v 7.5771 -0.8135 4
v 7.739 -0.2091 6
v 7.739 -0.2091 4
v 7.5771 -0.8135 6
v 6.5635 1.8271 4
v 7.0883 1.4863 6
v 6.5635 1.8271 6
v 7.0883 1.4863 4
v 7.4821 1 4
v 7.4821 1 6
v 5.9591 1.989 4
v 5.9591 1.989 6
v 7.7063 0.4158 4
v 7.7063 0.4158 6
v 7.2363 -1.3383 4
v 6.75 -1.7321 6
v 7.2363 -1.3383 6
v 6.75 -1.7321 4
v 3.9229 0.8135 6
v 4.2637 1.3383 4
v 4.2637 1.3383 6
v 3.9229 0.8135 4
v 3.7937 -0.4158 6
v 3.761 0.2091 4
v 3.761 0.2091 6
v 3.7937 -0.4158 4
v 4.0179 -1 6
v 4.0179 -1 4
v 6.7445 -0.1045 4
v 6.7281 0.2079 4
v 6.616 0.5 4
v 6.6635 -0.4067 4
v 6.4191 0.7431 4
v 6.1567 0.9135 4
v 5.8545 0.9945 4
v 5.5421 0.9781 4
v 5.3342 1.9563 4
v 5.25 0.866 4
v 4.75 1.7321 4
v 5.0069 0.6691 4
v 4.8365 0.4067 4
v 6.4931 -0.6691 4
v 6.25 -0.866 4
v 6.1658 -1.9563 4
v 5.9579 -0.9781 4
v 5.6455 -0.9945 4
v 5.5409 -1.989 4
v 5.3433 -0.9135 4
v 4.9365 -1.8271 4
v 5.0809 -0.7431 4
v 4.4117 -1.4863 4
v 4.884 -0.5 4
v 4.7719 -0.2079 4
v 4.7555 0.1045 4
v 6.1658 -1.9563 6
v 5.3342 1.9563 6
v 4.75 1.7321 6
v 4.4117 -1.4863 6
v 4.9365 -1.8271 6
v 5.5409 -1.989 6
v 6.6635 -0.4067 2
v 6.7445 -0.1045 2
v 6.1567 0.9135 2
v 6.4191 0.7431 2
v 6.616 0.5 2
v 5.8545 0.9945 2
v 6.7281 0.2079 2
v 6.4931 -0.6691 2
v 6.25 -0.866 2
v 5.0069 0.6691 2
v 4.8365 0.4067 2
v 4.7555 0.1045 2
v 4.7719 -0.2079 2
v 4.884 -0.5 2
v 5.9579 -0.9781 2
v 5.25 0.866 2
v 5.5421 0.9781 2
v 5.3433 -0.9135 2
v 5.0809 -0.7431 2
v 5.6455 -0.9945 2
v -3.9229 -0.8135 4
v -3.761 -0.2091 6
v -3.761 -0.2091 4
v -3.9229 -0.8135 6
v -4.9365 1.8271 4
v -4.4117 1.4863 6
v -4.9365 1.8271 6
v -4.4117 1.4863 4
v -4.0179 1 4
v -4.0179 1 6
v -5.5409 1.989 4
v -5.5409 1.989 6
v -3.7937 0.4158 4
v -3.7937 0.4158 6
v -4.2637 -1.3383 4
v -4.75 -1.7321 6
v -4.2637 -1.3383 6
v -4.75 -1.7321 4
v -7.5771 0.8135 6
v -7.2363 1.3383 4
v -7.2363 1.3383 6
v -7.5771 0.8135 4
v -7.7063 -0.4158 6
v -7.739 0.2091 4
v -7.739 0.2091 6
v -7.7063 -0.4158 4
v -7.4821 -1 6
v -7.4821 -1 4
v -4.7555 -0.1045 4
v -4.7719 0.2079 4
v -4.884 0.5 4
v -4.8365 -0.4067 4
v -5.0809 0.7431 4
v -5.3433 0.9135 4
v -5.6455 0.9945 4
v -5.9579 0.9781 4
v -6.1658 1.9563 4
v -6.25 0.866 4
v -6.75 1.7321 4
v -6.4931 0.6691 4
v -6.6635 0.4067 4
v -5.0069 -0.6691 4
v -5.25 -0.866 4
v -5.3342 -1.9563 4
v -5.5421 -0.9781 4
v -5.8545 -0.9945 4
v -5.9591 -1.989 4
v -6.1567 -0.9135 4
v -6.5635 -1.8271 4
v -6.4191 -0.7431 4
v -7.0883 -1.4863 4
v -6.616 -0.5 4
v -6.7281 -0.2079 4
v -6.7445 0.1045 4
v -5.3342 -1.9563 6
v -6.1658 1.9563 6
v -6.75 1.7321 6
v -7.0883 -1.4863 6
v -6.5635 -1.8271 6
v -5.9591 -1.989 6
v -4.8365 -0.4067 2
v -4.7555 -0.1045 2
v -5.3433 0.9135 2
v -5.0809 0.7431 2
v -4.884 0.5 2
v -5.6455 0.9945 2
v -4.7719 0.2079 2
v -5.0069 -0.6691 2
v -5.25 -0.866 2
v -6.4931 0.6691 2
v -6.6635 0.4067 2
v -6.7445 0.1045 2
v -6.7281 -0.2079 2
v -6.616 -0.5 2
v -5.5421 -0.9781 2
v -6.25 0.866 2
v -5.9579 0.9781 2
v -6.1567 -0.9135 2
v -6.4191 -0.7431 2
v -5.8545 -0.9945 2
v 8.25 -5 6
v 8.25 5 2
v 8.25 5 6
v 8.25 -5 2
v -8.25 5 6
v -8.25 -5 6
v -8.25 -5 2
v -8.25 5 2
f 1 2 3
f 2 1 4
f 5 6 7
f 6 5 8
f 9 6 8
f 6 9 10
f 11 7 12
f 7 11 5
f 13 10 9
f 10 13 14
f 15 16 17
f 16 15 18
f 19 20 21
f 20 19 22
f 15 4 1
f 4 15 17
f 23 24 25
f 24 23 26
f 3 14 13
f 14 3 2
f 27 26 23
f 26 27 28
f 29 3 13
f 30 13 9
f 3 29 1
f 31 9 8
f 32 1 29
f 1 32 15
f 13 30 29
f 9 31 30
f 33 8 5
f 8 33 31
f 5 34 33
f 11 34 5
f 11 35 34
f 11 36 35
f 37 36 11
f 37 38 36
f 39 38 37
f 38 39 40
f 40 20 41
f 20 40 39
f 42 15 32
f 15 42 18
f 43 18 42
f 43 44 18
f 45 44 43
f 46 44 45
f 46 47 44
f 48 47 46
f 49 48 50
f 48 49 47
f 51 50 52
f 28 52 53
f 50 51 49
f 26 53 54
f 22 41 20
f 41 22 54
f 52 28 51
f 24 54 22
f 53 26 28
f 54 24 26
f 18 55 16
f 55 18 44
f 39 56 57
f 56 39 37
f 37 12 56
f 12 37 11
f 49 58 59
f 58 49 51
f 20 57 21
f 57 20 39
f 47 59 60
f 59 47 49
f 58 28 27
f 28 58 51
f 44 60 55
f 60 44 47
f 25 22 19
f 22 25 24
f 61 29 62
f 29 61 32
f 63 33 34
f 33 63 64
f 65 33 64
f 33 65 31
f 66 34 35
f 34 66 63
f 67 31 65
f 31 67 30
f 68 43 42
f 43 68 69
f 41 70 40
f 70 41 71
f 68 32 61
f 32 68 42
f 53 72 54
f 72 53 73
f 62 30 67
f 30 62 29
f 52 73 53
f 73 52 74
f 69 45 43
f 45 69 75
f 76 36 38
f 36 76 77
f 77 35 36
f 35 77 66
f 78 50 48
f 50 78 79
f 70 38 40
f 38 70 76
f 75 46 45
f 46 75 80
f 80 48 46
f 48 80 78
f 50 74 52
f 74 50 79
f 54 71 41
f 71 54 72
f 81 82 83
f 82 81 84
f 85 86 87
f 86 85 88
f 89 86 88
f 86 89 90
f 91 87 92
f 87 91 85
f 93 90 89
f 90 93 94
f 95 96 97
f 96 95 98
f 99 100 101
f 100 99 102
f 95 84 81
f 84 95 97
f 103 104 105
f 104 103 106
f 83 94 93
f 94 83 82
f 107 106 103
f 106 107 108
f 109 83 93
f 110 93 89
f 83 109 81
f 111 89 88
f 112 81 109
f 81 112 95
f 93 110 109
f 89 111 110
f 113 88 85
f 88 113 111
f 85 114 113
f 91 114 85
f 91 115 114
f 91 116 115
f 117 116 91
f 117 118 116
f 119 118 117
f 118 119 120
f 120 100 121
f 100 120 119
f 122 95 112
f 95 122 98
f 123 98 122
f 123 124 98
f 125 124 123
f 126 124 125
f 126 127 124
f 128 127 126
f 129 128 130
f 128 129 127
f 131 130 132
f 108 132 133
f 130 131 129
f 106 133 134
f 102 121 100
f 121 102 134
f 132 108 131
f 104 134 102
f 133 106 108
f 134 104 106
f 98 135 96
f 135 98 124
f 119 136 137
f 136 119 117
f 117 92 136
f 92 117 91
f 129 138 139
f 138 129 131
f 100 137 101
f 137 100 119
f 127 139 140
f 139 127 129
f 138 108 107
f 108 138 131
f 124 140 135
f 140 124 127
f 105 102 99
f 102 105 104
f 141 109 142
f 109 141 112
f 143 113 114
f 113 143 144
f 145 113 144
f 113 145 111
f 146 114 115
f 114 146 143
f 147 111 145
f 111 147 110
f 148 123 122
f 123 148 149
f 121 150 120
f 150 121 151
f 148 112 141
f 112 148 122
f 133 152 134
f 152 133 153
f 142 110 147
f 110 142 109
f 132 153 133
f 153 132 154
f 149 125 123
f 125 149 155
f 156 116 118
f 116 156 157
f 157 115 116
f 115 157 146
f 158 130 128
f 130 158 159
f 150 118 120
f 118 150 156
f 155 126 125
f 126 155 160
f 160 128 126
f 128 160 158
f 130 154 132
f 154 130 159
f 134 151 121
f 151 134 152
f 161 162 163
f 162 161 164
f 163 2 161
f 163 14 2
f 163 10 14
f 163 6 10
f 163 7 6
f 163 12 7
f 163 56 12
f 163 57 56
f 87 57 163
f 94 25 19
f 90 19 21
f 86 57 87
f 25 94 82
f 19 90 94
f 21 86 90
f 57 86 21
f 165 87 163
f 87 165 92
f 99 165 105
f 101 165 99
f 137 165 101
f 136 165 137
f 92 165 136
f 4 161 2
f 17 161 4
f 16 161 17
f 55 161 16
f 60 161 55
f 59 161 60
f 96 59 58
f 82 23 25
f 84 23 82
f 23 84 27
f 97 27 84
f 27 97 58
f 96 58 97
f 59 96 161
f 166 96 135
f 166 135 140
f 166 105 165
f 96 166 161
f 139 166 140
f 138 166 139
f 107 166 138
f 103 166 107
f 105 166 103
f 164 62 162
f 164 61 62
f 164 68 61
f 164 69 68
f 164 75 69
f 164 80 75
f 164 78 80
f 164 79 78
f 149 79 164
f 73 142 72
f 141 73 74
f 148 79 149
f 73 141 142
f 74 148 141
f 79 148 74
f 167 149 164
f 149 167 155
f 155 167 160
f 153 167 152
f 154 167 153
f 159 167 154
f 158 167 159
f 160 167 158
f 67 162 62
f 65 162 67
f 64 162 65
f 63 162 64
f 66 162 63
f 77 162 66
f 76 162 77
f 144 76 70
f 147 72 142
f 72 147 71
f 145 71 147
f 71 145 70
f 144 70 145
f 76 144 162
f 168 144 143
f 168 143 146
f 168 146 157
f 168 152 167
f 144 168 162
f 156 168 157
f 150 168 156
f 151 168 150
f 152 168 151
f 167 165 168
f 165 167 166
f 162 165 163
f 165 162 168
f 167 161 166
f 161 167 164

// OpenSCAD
$fn=20;

screw_m2_diameter = 2;
//screw_m2_height = 5;
screw_m2_head_diameter = 4;
screw_m2_head_height = 2;
screw_m2_nut_diameter = 5;
screw_m2_nut_height = 10;

//screw_m3_diameter = 3;
//screw_m3_height = 30;
//screw_m3_head_diameter = 6;
//screw_m3_head_height = 10;
//screw_m3_nut_diameter = 6.55;
//screw_m3_nut_height = 10;

screw_m3_diameter = screw_m2_diameter;
screw_m3_height = 30;
screw_m3_head_diameter = screw_m2_head_diameter;
screw_m3_head_height = 10;
screw_m3_nut_diameter = screw_m2_nut_diameter;
screw_m3_nut_height = 10;

// the minium material arougd screw
screw_material_thickness = 2;
screw_material_thickness_stronger = 3;

belt_width = 6.5;
belt_step_space = 2;

// space between parts
base_space = 2;

// computed

screw_m2_height = base_space + (screw_material_thickness * 2);

base_x = belt_width + (screw_m2_nut_diameter * 2);
base_y = 10;
base_bottom_z = screw_m3_nut_diameter + screw_material_thickness;
base_top_z = screw_material_thickness + screw_m2_head_height;
	
belt_step_radius = belt_step_space / 4;

echo("base_x", base_x);
echo("base_y", base_y);
echo("base_bottom_z", base_bottom_z);

module screw(
	screw_diameter, screw_height,
	screw_head_diameter, screw_head_height,
	screw_nut_diameter, screw_nut_height
) {
	color([0.2, 0.2, 0.2])
	union() {
		translate([0, 0, (screw_height / 2) + (screw_head_height / 2)])
		cylinder(r=(screw_head_diameter / 2), h=screw_head_height , center=true);
		
		cylinder(r=(screw_diameter / 2), h=(screw_height + 0.1) , center=true);
		
		translate([0, 0, -(screw_height / 2) - (screw_nut_height / 2)])
		cylinder(r=(screw_nut_diameter / 2), h=screw_nut_height, $fn=6 , center=true);
	}
}
//screw

module screw_m2() {
	screw(
		screw_m2_diameter, screw_m2_height,
		screw_m2_head_diameter, screw_m2_head_height + 0.01,
		screw_m2_nut_diameter, screw_m2_nut_height
	);
}
//screw_m2

module screw_m3() {
	screw(
		screw_m3_diameter, screw_m3_height,
		screw_m3_head_diameter, screw_m3_head_height,
		screw_m3_nut_diameter, screw_m3_nut_height
	);
}
//screw_m3

module positioned_screw_m2(pos_x) {
	translate([((belt_width / 2) + (screw_m2_nut_diameter / 2)) * pos_x, 0, (base_space / 2)])
	rotate([0, 0, 30])
	screw_m2();
}
// positioned_screw_m2

module positioned_screw_m3() {
	translate([0, (screw_m3_height / 2) + (base_y / 2) - screw_material_thickness_stronger, -(screw_m3_nut_diameter / 2) - screw_material_thickness])
	rotate([-90, 30, 0])
	screw_m3();
}
// positioned_screw_m3

module belt_step() {
	rotate([0, 90, 0])
	cylinder(r=belt_step_radius, h=belt_width , center=true);
}
//belt_step

module positioned_belt_step() {
	belt_step_offset = -(base_y / 2) + belt_step_radius;
	
	i = 0;
	end = belt_step_offset + base_y - belt_step_radius;
	for(pos_y = [belt_step_offset : belt_step_space : end]) {
		translate([0, pos_y, 0])
		belt_step();
	}
}
// positioned_belt_step

module base_bottom() {
	translate([0, 0, -(base_bottom_z / 2)])
	cube([base_x, base_y, base_bottom_z], center = true);
}
//base_bottom

module base_top() {
	color([1, 1, 0, 0.7])
	translate([0, 0, (base_top_z / 2) + base_space])
	cube([base_x, base_y, base_top_z], center = true);
}
//base_top

module _render_bottom() {
	color([1, 1, 0, 0.7])
	difference() {
		union() {
			base_bottom();
			positioned_belt_step();
		}
		
		union() {
			positioned_screw_m3();
			positioned_screw_m2(1);
			positioned_screw_m2(-1);
		}
	}
}
// _render_bottom

module _render_top() {
	color([1, 1, 0, 0.7])
	difference() {
		base_top();
		
		union() {
			positioned_screw_m2(1);
			positioned_screw_m2(-1);
		}
	}
}
// _render_top

_render_top();
//_render_bottom();
